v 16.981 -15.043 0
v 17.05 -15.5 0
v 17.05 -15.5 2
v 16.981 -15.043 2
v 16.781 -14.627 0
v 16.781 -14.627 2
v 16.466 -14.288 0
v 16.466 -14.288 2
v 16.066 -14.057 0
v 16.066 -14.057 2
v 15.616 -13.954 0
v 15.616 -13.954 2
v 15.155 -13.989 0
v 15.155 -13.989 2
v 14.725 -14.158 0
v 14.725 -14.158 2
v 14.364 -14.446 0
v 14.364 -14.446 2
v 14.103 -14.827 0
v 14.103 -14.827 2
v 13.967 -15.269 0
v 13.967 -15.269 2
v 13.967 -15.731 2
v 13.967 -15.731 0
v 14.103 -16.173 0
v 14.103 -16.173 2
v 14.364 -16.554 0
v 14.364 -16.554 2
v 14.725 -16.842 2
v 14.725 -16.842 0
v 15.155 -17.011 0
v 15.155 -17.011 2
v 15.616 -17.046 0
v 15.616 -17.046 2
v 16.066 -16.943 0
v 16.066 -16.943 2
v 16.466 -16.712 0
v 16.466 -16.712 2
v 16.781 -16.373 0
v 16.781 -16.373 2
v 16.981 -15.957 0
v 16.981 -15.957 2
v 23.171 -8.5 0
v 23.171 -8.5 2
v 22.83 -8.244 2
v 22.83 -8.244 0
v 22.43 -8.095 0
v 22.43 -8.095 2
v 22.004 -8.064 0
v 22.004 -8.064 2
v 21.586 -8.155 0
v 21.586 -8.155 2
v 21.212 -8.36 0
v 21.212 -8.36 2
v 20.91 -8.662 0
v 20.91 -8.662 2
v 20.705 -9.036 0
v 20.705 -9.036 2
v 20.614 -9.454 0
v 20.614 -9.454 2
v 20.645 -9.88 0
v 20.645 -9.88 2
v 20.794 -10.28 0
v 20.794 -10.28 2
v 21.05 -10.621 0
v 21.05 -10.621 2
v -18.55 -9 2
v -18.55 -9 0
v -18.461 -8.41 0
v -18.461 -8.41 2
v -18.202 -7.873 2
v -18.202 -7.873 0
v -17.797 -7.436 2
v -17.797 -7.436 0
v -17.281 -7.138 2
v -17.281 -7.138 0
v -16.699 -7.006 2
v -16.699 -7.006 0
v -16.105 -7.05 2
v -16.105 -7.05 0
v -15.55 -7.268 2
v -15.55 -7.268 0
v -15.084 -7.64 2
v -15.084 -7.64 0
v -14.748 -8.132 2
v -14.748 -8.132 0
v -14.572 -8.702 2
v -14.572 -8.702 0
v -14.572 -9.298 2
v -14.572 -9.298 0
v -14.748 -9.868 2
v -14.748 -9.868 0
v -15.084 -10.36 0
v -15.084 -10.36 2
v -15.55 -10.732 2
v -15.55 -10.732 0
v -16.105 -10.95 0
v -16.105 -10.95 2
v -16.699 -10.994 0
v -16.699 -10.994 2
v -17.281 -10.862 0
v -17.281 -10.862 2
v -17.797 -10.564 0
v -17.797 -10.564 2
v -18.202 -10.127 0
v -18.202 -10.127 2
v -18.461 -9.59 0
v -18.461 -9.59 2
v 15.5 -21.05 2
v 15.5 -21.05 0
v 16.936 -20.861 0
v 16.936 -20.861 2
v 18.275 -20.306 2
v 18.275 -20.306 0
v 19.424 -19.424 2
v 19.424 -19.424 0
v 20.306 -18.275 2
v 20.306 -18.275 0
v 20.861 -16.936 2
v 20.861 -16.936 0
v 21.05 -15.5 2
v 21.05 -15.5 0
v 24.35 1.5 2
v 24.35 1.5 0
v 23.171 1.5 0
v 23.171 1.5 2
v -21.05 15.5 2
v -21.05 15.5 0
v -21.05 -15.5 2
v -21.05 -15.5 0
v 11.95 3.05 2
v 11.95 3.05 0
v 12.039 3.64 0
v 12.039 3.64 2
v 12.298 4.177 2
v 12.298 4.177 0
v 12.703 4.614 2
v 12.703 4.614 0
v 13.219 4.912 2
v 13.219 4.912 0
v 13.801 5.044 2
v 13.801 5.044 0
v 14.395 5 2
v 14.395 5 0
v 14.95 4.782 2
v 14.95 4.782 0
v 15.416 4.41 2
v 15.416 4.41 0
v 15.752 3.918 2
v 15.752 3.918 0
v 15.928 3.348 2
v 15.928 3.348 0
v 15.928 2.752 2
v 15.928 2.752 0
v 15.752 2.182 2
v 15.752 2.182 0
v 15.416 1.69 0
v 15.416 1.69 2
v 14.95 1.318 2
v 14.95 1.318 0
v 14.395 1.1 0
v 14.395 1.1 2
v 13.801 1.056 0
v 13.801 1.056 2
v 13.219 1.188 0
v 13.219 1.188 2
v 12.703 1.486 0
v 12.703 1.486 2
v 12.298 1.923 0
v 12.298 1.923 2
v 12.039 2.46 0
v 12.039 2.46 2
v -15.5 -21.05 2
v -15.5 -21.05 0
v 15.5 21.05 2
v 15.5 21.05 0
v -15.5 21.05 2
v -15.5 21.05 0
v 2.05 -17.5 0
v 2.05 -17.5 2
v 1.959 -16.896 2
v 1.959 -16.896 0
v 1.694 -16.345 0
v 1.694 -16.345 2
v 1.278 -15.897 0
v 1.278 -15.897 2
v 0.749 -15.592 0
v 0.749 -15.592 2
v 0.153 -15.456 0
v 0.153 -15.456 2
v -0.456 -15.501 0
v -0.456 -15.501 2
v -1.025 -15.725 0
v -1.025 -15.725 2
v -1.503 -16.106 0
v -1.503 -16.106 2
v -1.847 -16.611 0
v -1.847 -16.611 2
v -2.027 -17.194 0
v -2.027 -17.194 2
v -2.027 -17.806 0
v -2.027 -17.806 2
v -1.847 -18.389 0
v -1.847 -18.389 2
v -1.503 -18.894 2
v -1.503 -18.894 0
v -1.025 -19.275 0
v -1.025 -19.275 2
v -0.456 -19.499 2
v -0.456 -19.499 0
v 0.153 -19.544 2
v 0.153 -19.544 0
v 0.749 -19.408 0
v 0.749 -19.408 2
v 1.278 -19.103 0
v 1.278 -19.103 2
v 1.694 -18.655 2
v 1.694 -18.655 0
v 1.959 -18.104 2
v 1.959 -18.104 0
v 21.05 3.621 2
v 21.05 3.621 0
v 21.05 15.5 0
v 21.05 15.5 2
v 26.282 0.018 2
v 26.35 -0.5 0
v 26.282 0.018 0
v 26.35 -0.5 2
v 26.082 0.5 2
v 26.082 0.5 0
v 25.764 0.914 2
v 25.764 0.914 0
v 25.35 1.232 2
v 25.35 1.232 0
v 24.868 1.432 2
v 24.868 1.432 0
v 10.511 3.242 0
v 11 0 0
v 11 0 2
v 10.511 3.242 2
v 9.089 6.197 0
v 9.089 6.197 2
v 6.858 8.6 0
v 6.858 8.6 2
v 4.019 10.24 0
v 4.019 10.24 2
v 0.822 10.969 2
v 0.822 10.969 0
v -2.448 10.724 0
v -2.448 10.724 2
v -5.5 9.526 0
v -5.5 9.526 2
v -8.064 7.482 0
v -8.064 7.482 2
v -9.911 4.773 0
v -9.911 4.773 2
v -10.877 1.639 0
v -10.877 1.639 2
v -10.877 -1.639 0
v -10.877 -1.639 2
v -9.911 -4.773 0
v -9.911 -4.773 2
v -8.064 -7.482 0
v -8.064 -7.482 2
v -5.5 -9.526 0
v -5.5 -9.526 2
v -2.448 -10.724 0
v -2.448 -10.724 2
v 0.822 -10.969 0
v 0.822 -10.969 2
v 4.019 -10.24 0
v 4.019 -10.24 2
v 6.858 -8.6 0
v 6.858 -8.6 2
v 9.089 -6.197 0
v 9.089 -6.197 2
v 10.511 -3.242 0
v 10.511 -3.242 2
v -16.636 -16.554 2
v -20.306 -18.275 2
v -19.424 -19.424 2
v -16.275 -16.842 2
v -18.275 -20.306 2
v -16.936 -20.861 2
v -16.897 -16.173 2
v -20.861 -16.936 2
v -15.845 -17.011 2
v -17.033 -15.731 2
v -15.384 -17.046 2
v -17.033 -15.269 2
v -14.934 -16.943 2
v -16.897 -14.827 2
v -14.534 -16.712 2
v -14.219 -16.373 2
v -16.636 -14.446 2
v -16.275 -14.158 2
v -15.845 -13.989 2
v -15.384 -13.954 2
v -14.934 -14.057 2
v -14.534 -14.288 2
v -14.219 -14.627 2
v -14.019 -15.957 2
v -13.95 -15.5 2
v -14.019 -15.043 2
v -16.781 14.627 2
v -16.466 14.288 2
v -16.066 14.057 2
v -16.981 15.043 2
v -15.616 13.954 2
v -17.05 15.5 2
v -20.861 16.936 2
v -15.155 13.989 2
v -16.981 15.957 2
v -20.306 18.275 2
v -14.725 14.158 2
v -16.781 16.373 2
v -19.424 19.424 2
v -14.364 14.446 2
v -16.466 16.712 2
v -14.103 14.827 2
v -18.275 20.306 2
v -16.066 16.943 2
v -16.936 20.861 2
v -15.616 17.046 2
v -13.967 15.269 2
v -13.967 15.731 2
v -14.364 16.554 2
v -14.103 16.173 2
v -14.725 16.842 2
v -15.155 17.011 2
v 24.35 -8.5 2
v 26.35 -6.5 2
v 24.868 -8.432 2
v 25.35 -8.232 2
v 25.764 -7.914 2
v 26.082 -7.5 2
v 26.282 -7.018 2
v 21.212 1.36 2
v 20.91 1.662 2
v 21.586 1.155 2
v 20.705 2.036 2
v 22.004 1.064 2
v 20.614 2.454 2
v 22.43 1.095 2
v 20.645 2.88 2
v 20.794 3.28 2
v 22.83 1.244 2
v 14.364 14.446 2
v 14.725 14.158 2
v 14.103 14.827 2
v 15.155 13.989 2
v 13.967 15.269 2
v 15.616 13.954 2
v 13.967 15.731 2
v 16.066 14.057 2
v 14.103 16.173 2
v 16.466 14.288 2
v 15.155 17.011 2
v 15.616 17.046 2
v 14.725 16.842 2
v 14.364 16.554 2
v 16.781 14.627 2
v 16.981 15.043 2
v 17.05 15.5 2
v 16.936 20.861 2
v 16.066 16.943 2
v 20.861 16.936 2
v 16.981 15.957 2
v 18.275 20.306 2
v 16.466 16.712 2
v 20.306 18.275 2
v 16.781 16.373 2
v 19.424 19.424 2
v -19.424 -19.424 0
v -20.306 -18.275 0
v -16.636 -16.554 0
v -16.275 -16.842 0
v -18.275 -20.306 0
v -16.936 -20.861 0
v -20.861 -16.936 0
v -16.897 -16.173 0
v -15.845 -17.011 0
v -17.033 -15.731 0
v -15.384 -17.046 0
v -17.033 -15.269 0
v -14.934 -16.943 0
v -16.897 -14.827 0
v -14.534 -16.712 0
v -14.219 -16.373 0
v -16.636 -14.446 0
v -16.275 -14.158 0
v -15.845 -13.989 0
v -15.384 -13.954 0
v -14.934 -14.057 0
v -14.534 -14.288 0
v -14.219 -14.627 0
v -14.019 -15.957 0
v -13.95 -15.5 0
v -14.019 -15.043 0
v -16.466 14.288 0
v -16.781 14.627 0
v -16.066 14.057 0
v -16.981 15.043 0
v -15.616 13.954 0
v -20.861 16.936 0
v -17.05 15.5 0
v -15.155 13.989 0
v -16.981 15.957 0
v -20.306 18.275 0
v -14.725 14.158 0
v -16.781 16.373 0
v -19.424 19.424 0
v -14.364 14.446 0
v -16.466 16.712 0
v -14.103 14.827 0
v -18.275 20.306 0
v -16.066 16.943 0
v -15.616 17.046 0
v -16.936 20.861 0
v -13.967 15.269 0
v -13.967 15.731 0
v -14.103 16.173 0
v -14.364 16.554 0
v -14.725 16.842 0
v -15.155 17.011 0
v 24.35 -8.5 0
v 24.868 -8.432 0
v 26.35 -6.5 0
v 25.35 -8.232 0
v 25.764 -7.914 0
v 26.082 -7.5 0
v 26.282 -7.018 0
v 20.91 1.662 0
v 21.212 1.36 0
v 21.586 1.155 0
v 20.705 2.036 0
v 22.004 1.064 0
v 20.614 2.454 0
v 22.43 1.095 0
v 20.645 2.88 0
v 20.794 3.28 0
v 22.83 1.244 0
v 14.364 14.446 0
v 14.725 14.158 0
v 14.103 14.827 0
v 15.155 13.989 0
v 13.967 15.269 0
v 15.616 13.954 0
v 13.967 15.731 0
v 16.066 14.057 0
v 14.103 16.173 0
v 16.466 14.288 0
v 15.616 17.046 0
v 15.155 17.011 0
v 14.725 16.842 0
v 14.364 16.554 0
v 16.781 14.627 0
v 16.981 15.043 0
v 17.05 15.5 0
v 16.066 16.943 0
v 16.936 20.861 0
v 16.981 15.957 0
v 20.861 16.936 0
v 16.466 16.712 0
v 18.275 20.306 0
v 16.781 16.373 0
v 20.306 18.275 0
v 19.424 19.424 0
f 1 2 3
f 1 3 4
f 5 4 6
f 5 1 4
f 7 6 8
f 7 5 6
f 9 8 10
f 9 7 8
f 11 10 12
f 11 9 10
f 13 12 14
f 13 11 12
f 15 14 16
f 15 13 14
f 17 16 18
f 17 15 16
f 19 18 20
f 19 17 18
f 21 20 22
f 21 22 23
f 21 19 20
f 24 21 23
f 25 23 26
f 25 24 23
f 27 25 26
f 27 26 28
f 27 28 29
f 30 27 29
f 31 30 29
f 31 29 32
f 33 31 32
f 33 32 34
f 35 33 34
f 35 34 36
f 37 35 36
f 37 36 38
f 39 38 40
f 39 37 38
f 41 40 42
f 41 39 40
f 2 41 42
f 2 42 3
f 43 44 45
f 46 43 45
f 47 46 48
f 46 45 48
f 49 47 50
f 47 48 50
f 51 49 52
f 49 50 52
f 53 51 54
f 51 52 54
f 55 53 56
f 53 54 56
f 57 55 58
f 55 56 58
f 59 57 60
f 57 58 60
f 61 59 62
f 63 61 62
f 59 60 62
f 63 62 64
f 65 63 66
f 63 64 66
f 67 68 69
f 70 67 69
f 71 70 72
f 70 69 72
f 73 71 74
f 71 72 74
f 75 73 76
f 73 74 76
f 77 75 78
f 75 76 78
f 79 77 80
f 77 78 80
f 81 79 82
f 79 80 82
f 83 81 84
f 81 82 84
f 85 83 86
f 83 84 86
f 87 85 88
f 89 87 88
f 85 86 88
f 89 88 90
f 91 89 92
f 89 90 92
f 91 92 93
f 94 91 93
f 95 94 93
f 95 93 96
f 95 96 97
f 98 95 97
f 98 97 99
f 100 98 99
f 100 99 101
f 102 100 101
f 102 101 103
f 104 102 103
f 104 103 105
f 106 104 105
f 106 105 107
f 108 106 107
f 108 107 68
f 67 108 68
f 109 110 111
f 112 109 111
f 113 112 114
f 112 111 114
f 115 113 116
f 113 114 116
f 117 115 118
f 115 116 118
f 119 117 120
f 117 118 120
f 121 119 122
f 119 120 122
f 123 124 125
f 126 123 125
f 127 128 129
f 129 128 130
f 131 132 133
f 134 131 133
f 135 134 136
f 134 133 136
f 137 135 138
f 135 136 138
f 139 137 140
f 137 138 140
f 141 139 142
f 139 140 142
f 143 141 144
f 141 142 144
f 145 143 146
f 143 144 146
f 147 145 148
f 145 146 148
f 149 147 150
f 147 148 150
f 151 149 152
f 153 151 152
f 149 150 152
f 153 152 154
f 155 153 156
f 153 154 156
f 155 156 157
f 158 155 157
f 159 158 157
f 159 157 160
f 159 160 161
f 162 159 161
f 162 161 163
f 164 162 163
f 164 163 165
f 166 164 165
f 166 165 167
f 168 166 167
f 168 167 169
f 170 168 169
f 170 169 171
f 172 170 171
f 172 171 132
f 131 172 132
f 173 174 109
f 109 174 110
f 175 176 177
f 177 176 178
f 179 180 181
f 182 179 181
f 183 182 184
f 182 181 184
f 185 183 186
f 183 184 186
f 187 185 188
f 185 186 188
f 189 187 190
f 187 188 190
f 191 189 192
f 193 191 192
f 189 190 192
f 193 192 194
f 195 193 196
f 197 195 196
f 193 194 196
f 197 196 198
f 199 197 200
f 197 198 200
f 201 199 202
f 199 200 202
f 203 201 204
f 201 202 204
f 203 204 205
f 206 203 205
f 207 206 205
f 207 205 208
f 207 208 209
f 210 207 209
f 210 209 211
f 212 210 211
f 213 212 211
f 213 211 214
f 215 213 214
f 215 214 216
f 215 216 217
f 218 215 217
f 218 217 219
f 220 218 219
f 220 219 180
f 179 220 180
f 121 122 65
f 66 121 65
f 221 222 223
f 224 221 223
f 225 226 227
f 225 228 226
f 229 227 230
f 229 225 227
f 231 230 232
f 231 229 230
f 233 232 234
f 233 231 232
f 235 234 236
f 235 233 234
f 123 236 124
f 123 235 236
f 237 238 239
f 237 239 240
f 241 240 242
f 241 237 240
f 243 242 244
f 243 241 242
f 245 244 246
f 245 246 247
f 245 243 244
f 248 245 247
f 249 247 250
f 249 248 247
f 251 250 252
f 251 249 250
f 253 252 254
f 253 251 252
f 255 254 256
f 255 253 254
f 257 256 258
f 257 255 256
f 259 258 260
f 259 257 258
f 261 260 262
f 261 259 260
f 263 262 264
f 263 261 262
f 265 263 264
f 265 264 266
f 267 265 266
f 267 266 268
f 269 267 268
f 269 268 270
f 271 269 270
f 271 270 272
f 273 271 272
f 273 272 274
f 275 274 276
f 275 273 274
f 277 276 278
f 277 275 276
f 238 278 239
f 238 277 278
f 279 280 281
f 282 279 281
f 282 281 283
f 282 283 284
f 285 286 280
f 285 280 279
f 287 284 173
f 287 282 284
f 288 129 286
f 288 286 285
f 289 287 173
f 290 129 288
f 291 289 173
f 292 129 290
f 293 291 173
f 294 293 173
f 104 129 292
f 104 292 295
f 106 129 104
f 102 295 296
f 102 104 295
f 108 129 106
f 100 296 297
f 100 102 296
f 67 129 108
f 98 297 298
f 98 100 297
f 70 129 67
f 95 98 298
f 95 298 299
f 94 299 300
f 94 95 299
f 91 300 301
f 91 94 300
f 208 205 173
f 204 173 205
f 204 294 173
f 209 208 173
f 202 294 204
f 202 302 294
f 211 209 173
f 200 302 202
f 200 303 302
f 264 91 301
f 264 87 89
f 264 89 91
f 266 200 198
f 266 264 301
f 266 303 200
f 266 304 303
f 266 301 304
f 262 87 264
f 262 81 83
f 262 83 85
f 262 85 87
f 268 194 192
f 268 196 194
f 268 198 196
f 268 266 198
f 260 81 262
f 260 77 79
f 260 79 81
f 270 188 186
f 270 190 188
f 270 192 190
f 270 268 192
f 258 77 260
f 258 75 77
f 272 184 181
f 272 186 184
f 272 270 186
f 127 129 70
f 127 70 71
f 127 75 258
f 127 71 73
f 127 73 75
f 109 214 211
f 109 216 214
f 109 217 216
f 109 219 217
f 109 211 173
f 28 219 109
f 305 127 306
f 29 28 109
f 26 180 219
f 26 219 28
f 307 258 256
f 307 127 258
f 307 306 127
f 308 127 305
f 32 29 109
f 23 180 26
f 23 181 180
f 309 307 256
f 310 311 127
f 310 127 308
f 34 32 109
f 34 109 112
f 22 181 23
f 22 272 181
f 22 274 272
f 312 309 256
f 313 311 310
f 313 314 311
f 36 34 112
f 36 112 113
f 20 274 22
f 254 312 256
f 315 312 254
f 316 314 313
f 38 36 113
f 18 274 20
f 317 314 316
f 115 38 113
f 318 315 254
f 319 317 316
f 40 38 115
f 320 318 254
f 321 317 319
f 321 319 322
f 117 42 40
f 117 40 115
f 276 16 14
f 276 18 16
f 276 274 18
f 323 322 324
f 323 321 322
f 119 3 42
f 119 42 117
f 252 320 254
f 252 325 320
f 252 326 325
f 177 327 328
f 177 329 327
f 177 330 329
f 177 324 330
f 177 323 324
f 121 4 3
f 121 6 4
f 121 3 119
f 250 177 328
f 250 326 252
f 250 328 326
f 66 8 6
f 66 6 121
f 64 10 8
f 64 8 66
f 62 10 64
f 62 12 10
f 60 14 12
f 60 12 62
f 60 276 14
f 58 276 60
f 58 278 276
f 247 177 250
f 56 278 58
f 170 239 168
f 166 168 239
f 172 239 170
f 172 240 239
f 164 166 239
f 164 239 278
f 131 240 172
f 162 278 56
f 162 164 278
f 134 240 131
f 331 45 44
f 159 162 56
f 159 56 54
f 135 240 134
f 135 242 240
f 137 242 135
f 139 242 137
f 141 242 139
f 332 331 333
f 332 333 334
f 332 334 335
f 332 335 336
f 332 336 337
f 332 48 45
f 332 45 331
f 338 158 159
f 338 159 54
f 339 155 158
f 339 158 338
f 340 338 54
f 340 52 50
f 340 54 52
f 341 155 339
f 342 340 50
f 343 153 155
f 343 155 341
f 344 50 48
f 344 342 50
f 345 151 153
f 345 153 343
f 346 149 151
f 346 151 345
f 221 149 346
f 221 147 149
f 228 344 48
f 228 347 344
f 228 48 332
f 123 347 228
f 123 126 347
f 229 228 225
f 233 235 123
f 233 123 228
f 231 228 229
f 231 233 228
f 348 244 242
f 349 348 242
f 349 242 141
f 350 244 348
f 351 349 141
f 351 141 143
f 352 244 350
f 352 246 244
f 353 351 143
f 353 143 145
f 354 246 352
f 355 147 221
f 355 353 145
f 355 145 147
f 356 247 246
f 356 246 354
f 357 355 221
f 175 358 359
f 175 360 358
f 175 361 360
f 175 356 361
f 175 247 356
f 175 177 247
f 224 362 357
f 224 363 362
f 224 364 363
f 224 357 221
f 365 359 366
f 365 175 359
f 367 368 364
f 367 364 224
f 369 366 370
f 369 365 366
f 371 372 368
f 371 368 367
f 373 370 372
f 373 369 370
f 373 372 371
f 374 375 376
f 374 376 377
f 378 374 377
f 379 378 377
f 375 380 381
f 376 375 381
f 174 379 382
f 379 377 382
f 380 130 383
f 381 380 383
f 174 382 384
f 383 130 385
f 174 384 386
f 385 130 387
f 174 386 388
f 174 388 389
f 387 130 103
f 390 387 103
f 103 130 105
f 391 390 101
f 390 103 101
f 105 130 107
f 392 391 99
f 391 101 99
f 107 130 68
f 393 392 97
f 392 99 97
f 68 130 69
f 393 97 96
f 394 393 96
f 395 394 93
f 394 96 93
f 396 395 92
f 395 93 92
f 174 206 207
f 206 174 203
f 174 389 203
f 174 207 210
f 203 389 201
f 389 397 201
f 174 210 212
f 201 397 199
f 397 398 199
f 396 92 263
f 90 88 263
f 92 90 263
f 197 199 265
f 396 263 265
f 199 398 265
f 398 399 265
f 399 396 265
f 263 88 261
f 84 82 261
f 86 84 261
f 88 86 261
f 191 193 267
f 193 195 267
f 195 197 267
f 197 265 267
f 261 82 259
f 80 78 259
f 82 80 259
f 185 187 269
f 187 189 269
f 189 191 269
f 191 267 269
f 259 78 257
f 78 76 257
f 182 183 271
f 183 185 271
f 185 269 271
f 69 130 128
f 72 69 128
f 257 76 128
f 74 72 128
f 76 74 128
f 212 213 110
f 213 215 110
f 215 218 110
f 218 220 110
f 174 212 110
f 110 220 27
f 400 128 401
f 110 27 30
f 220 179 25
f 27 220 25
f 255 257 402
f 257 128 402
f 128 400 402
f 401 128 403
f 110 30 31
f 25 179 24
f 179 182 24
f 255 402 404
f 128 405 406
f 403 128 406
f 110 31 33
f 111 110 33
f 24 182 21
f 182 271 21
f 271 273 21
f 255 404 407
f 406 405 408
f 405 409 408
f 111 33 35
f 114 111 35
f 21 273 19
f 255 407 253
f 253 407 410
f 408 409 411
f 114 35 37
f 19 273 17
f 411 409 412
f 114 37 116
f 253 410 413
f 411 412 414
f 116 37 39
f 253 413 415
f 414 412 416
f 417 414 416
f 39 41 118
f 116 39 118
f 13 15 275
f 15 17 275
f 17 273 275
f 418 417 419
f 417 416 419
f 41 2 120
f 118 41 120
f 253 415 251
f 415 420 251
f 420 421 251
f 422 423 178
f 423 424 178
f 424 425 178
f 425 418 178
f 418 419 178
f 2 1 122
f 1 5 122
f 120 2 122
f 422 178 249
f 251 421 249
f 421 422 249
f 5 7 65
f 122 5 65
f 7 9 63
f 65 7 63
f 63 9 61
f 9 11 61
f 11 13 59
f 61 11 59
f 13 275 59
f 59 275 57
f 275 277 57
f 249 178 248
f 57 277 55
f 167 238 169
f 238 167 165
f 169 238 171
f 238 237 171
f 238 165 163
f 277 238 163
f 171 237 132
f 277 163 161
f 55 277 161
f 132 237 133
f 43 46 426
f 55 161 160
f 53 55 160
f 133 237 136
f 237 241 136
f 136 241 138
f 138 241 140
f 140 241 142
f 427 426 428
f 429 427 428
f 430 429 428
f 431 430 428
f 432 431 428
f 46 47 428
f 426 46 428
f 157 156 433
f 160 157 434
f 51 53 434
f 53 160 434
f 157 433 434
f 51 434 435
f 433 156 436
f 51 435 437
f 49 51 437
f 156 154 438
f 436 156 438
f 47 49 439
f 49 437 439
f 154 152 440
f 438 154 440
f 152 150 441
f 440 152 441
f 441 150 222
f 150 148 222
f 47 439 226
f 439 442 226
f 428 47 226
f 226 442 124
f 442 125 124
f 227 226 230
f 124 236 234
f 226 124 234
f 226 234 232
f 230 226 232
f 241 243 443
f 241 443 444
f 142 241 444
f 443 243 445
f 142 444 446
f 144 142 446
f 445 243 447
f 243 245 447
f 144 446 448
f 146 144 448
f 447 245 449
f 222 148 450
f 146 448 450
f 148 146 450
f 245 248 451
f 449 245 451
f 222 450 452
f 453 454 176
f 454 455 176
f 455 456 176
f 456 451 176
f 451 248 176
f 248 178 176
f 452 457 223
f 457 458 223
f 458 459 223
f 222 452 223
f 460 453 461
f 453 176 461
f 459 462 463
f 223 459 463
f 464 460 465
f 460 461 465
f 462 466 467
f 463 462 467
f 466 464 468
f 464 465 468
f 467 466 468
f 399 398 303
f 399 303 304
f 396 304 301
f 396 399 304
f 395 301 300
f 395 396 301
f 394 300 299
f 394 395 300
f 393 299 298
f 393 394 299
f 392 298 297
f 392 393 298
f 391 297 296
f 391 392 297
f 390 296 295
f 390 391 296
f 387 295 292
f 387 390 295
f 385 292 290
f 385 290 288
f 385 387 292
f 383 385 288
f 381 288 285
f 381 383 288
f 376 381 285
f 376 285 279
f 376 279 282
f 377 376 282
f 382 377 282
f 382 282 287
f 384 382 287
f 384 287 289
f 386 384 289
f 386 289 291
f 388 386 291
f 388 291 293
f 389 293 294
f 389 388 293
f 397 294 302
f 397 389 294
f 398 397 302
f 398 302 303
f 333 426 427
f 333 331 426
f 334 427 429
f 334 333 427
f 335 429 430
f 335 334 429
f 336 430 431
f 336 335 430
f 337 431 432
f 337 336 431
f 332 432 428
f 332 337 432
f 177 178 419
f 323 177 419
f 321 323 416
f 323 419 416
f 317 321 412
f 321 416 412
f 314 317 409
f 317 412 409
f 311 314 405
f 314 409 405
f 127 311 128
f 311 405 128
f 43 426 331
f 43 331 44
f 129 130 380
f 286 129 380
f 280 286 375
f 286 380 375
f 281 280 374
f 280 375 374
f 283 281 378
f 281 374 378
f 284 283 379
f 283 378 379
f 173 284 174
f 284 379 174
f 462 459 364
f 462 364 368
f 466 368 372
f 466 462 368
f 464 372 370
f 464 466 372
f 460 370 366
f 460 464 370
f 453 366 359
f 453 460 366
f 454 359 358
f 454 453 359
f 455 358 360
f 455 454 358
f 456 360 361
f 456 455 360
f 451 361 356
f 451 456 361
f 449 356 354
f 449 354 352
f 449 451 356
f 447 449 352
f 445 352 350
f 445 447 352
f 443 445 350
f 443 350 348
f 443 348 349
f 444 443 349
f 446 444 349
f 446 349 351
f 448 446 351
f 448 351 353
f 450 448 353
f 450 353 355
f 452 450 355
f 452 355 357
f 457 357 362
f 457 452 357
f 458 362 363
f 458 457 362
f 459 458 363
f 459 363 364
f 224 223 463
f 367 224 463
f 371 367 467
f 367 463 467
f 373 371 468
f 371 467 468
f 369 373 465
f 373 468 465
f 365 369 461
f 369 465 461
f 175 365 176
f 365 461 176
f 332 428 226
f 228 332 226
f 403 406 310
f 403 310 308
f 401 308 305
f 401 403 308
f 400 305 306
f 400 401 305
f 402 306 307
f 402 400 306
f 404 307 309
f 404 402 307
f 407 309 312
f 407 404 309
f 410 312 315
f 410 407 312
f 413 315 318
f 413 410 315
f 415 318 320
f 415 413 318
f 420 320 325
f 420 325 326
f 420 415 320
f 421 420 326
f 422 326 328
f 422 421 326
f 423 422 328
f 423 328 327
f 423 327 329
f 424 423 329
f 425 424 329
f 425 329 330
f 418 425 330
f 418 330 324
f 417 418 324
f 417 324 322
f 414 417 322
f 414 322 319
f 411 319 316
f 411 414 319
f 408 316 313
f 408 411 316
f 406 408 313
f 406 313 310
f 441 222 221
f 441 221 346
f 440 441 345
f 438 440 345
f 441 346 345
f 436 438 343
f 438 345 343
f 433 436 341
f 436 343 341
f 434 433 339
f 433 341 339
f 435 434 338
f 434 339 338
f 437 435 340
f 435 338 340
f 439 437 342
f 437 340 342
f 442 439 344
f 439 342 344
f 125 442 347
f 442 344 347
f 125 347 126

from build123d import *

# Parameters (mm, degrees)
SKETCH1_R           = 11
SKETCH1_R_2         = 1.55
BOSS_EXTRUDE1_DEPTH = 2
SKETCH2_R           = 2.05
CUT_EXTRUDE1_DEPTH  = 30.83630339
SKETCH5_W           = 5.3
SKETCH5_H           = 10
BOSS_EXTRUDE3_DEPTH = 2
FILLET1_R           = 2
SKETCH6_R           = 1.5
CUT_EXTRUDE3_DEPTH  = 34.784981871
SKETCH7_R           = 2
CUT_EXTRUDE6_DEPTH  = 34.784981871


with BuildPart() as part:
    # Sketch1 → Boss-Extrude1 (new body)
    with BuildSketch(Plane.XY):
        with BuildLine():
            Line((-21.05, 15.5), (-21.05, -15.5))
            ThreePointArc((-21.05, -15.5), (-19.424442636, -19.424442636), (-15.5, -21.05))
            Line((-15.5, -21.05), (15.5, -21.05))
            ThreePointArc((15.5, -21.05), (19.424442636, -19.424442636), (21.05, -15.5))
            Line((21.05, -15.5), (21.05, 15.5))
            ThreePointArc((21.05, 15.5), (19.424442636, 19.424442636), (15.5, 21.05))
            Line((15.5, 21.05), (-15.5, 21.05))
            ThreePointArc((-15.5, 21.05), (-19.424442636, 19.424442636), (-21.05, 15.5))
        make_face()
        Circle(SKETCH1_R, mode=Mode.SUBTRACT)
        with Locations((-15.5, -15.5)):
            Circle(SKETCH1_R_2, mode=Mode.SUBTRACT)
        with Locations((15.5, 15.5)):
            Circle(SKETCH1_R_2, mode=Mode.SUBTRACT)
        with Locations(Location((-15.5, 15.5, 0), (0, 0, 180))):
            Circle(SKETCH1_R_2, mode=Mode.SUBTRACT)
        with Locations((15.5, -15.5)):
            Circle(SKETCH1_R_2, mode=Mode.SUBTRACT)
    extrude(amount=BOSS_EXTRUDE1_DEPTH)

    # Sketch2 → Cut-Extrude1 (cut, through all)
    with BuildSketch(Plane.XY.offset(2)):
        with Locations((0, -17.5)):
            Circle(SKETCH2_R)
    extrude(amount=-CUT_EXTRUDE1_DEPTH, mode=Mode.SUBTRACT)

    # Sketch5 → Boss-Extrude3 (add)
    with BuildSketch(Plane(origin=(0, 0, 0), x_dir=(-1, 0, 0), z_dir=(0, 0, -1))):
        with Locations((-23.7, -3.5)):
            Rectangle(SKETCH5_W, SKETCH5_H)
    extrude(amount=-BOSS_EXTRUDE3_DEPTH)

    # Fillet1
    fillet1_edges = [part.edges().sort_by_distance(p)[0] for p in [
        (26.35, -8.5, 1),
        (26.35, 1.5, 1),
    ]]
    fillet(fillet1_edges, radius=FILLET1_R)

    # Sketch6 → Cut-Extrude3 (cut, through all)
    with BuildSketch(Plane.XY.offset(2)):
        with Locations((22.110660172, 2.560660172)):
            Circle(SKETCH6_R)
        with Locations((22.110660172, -9.560660172)):
            Circle(SKETCH6_R)
    extrude(amount=-CUT_EXTRUDE3_DEPTH, mode=Mode.SUBTRACT)

    # Sketch7 → Cut-Extrude6 (cut, through all)
    with BuildSketch(Plane(origin=(0, 0, 0), x_dir=(-1, 0, 0), z_dir=(0, 0, -1))):
        with Locations((-13.95, 3.05)):
            Circle(SKETCH7_R)
        with Locations((16.55, -9)):
            Circle(SKETCH7_R)
    extrude(amount=-CUT_EXTRUDE6_DEPTH, mode=Mode.SUBTRACT)


solid = part.part
